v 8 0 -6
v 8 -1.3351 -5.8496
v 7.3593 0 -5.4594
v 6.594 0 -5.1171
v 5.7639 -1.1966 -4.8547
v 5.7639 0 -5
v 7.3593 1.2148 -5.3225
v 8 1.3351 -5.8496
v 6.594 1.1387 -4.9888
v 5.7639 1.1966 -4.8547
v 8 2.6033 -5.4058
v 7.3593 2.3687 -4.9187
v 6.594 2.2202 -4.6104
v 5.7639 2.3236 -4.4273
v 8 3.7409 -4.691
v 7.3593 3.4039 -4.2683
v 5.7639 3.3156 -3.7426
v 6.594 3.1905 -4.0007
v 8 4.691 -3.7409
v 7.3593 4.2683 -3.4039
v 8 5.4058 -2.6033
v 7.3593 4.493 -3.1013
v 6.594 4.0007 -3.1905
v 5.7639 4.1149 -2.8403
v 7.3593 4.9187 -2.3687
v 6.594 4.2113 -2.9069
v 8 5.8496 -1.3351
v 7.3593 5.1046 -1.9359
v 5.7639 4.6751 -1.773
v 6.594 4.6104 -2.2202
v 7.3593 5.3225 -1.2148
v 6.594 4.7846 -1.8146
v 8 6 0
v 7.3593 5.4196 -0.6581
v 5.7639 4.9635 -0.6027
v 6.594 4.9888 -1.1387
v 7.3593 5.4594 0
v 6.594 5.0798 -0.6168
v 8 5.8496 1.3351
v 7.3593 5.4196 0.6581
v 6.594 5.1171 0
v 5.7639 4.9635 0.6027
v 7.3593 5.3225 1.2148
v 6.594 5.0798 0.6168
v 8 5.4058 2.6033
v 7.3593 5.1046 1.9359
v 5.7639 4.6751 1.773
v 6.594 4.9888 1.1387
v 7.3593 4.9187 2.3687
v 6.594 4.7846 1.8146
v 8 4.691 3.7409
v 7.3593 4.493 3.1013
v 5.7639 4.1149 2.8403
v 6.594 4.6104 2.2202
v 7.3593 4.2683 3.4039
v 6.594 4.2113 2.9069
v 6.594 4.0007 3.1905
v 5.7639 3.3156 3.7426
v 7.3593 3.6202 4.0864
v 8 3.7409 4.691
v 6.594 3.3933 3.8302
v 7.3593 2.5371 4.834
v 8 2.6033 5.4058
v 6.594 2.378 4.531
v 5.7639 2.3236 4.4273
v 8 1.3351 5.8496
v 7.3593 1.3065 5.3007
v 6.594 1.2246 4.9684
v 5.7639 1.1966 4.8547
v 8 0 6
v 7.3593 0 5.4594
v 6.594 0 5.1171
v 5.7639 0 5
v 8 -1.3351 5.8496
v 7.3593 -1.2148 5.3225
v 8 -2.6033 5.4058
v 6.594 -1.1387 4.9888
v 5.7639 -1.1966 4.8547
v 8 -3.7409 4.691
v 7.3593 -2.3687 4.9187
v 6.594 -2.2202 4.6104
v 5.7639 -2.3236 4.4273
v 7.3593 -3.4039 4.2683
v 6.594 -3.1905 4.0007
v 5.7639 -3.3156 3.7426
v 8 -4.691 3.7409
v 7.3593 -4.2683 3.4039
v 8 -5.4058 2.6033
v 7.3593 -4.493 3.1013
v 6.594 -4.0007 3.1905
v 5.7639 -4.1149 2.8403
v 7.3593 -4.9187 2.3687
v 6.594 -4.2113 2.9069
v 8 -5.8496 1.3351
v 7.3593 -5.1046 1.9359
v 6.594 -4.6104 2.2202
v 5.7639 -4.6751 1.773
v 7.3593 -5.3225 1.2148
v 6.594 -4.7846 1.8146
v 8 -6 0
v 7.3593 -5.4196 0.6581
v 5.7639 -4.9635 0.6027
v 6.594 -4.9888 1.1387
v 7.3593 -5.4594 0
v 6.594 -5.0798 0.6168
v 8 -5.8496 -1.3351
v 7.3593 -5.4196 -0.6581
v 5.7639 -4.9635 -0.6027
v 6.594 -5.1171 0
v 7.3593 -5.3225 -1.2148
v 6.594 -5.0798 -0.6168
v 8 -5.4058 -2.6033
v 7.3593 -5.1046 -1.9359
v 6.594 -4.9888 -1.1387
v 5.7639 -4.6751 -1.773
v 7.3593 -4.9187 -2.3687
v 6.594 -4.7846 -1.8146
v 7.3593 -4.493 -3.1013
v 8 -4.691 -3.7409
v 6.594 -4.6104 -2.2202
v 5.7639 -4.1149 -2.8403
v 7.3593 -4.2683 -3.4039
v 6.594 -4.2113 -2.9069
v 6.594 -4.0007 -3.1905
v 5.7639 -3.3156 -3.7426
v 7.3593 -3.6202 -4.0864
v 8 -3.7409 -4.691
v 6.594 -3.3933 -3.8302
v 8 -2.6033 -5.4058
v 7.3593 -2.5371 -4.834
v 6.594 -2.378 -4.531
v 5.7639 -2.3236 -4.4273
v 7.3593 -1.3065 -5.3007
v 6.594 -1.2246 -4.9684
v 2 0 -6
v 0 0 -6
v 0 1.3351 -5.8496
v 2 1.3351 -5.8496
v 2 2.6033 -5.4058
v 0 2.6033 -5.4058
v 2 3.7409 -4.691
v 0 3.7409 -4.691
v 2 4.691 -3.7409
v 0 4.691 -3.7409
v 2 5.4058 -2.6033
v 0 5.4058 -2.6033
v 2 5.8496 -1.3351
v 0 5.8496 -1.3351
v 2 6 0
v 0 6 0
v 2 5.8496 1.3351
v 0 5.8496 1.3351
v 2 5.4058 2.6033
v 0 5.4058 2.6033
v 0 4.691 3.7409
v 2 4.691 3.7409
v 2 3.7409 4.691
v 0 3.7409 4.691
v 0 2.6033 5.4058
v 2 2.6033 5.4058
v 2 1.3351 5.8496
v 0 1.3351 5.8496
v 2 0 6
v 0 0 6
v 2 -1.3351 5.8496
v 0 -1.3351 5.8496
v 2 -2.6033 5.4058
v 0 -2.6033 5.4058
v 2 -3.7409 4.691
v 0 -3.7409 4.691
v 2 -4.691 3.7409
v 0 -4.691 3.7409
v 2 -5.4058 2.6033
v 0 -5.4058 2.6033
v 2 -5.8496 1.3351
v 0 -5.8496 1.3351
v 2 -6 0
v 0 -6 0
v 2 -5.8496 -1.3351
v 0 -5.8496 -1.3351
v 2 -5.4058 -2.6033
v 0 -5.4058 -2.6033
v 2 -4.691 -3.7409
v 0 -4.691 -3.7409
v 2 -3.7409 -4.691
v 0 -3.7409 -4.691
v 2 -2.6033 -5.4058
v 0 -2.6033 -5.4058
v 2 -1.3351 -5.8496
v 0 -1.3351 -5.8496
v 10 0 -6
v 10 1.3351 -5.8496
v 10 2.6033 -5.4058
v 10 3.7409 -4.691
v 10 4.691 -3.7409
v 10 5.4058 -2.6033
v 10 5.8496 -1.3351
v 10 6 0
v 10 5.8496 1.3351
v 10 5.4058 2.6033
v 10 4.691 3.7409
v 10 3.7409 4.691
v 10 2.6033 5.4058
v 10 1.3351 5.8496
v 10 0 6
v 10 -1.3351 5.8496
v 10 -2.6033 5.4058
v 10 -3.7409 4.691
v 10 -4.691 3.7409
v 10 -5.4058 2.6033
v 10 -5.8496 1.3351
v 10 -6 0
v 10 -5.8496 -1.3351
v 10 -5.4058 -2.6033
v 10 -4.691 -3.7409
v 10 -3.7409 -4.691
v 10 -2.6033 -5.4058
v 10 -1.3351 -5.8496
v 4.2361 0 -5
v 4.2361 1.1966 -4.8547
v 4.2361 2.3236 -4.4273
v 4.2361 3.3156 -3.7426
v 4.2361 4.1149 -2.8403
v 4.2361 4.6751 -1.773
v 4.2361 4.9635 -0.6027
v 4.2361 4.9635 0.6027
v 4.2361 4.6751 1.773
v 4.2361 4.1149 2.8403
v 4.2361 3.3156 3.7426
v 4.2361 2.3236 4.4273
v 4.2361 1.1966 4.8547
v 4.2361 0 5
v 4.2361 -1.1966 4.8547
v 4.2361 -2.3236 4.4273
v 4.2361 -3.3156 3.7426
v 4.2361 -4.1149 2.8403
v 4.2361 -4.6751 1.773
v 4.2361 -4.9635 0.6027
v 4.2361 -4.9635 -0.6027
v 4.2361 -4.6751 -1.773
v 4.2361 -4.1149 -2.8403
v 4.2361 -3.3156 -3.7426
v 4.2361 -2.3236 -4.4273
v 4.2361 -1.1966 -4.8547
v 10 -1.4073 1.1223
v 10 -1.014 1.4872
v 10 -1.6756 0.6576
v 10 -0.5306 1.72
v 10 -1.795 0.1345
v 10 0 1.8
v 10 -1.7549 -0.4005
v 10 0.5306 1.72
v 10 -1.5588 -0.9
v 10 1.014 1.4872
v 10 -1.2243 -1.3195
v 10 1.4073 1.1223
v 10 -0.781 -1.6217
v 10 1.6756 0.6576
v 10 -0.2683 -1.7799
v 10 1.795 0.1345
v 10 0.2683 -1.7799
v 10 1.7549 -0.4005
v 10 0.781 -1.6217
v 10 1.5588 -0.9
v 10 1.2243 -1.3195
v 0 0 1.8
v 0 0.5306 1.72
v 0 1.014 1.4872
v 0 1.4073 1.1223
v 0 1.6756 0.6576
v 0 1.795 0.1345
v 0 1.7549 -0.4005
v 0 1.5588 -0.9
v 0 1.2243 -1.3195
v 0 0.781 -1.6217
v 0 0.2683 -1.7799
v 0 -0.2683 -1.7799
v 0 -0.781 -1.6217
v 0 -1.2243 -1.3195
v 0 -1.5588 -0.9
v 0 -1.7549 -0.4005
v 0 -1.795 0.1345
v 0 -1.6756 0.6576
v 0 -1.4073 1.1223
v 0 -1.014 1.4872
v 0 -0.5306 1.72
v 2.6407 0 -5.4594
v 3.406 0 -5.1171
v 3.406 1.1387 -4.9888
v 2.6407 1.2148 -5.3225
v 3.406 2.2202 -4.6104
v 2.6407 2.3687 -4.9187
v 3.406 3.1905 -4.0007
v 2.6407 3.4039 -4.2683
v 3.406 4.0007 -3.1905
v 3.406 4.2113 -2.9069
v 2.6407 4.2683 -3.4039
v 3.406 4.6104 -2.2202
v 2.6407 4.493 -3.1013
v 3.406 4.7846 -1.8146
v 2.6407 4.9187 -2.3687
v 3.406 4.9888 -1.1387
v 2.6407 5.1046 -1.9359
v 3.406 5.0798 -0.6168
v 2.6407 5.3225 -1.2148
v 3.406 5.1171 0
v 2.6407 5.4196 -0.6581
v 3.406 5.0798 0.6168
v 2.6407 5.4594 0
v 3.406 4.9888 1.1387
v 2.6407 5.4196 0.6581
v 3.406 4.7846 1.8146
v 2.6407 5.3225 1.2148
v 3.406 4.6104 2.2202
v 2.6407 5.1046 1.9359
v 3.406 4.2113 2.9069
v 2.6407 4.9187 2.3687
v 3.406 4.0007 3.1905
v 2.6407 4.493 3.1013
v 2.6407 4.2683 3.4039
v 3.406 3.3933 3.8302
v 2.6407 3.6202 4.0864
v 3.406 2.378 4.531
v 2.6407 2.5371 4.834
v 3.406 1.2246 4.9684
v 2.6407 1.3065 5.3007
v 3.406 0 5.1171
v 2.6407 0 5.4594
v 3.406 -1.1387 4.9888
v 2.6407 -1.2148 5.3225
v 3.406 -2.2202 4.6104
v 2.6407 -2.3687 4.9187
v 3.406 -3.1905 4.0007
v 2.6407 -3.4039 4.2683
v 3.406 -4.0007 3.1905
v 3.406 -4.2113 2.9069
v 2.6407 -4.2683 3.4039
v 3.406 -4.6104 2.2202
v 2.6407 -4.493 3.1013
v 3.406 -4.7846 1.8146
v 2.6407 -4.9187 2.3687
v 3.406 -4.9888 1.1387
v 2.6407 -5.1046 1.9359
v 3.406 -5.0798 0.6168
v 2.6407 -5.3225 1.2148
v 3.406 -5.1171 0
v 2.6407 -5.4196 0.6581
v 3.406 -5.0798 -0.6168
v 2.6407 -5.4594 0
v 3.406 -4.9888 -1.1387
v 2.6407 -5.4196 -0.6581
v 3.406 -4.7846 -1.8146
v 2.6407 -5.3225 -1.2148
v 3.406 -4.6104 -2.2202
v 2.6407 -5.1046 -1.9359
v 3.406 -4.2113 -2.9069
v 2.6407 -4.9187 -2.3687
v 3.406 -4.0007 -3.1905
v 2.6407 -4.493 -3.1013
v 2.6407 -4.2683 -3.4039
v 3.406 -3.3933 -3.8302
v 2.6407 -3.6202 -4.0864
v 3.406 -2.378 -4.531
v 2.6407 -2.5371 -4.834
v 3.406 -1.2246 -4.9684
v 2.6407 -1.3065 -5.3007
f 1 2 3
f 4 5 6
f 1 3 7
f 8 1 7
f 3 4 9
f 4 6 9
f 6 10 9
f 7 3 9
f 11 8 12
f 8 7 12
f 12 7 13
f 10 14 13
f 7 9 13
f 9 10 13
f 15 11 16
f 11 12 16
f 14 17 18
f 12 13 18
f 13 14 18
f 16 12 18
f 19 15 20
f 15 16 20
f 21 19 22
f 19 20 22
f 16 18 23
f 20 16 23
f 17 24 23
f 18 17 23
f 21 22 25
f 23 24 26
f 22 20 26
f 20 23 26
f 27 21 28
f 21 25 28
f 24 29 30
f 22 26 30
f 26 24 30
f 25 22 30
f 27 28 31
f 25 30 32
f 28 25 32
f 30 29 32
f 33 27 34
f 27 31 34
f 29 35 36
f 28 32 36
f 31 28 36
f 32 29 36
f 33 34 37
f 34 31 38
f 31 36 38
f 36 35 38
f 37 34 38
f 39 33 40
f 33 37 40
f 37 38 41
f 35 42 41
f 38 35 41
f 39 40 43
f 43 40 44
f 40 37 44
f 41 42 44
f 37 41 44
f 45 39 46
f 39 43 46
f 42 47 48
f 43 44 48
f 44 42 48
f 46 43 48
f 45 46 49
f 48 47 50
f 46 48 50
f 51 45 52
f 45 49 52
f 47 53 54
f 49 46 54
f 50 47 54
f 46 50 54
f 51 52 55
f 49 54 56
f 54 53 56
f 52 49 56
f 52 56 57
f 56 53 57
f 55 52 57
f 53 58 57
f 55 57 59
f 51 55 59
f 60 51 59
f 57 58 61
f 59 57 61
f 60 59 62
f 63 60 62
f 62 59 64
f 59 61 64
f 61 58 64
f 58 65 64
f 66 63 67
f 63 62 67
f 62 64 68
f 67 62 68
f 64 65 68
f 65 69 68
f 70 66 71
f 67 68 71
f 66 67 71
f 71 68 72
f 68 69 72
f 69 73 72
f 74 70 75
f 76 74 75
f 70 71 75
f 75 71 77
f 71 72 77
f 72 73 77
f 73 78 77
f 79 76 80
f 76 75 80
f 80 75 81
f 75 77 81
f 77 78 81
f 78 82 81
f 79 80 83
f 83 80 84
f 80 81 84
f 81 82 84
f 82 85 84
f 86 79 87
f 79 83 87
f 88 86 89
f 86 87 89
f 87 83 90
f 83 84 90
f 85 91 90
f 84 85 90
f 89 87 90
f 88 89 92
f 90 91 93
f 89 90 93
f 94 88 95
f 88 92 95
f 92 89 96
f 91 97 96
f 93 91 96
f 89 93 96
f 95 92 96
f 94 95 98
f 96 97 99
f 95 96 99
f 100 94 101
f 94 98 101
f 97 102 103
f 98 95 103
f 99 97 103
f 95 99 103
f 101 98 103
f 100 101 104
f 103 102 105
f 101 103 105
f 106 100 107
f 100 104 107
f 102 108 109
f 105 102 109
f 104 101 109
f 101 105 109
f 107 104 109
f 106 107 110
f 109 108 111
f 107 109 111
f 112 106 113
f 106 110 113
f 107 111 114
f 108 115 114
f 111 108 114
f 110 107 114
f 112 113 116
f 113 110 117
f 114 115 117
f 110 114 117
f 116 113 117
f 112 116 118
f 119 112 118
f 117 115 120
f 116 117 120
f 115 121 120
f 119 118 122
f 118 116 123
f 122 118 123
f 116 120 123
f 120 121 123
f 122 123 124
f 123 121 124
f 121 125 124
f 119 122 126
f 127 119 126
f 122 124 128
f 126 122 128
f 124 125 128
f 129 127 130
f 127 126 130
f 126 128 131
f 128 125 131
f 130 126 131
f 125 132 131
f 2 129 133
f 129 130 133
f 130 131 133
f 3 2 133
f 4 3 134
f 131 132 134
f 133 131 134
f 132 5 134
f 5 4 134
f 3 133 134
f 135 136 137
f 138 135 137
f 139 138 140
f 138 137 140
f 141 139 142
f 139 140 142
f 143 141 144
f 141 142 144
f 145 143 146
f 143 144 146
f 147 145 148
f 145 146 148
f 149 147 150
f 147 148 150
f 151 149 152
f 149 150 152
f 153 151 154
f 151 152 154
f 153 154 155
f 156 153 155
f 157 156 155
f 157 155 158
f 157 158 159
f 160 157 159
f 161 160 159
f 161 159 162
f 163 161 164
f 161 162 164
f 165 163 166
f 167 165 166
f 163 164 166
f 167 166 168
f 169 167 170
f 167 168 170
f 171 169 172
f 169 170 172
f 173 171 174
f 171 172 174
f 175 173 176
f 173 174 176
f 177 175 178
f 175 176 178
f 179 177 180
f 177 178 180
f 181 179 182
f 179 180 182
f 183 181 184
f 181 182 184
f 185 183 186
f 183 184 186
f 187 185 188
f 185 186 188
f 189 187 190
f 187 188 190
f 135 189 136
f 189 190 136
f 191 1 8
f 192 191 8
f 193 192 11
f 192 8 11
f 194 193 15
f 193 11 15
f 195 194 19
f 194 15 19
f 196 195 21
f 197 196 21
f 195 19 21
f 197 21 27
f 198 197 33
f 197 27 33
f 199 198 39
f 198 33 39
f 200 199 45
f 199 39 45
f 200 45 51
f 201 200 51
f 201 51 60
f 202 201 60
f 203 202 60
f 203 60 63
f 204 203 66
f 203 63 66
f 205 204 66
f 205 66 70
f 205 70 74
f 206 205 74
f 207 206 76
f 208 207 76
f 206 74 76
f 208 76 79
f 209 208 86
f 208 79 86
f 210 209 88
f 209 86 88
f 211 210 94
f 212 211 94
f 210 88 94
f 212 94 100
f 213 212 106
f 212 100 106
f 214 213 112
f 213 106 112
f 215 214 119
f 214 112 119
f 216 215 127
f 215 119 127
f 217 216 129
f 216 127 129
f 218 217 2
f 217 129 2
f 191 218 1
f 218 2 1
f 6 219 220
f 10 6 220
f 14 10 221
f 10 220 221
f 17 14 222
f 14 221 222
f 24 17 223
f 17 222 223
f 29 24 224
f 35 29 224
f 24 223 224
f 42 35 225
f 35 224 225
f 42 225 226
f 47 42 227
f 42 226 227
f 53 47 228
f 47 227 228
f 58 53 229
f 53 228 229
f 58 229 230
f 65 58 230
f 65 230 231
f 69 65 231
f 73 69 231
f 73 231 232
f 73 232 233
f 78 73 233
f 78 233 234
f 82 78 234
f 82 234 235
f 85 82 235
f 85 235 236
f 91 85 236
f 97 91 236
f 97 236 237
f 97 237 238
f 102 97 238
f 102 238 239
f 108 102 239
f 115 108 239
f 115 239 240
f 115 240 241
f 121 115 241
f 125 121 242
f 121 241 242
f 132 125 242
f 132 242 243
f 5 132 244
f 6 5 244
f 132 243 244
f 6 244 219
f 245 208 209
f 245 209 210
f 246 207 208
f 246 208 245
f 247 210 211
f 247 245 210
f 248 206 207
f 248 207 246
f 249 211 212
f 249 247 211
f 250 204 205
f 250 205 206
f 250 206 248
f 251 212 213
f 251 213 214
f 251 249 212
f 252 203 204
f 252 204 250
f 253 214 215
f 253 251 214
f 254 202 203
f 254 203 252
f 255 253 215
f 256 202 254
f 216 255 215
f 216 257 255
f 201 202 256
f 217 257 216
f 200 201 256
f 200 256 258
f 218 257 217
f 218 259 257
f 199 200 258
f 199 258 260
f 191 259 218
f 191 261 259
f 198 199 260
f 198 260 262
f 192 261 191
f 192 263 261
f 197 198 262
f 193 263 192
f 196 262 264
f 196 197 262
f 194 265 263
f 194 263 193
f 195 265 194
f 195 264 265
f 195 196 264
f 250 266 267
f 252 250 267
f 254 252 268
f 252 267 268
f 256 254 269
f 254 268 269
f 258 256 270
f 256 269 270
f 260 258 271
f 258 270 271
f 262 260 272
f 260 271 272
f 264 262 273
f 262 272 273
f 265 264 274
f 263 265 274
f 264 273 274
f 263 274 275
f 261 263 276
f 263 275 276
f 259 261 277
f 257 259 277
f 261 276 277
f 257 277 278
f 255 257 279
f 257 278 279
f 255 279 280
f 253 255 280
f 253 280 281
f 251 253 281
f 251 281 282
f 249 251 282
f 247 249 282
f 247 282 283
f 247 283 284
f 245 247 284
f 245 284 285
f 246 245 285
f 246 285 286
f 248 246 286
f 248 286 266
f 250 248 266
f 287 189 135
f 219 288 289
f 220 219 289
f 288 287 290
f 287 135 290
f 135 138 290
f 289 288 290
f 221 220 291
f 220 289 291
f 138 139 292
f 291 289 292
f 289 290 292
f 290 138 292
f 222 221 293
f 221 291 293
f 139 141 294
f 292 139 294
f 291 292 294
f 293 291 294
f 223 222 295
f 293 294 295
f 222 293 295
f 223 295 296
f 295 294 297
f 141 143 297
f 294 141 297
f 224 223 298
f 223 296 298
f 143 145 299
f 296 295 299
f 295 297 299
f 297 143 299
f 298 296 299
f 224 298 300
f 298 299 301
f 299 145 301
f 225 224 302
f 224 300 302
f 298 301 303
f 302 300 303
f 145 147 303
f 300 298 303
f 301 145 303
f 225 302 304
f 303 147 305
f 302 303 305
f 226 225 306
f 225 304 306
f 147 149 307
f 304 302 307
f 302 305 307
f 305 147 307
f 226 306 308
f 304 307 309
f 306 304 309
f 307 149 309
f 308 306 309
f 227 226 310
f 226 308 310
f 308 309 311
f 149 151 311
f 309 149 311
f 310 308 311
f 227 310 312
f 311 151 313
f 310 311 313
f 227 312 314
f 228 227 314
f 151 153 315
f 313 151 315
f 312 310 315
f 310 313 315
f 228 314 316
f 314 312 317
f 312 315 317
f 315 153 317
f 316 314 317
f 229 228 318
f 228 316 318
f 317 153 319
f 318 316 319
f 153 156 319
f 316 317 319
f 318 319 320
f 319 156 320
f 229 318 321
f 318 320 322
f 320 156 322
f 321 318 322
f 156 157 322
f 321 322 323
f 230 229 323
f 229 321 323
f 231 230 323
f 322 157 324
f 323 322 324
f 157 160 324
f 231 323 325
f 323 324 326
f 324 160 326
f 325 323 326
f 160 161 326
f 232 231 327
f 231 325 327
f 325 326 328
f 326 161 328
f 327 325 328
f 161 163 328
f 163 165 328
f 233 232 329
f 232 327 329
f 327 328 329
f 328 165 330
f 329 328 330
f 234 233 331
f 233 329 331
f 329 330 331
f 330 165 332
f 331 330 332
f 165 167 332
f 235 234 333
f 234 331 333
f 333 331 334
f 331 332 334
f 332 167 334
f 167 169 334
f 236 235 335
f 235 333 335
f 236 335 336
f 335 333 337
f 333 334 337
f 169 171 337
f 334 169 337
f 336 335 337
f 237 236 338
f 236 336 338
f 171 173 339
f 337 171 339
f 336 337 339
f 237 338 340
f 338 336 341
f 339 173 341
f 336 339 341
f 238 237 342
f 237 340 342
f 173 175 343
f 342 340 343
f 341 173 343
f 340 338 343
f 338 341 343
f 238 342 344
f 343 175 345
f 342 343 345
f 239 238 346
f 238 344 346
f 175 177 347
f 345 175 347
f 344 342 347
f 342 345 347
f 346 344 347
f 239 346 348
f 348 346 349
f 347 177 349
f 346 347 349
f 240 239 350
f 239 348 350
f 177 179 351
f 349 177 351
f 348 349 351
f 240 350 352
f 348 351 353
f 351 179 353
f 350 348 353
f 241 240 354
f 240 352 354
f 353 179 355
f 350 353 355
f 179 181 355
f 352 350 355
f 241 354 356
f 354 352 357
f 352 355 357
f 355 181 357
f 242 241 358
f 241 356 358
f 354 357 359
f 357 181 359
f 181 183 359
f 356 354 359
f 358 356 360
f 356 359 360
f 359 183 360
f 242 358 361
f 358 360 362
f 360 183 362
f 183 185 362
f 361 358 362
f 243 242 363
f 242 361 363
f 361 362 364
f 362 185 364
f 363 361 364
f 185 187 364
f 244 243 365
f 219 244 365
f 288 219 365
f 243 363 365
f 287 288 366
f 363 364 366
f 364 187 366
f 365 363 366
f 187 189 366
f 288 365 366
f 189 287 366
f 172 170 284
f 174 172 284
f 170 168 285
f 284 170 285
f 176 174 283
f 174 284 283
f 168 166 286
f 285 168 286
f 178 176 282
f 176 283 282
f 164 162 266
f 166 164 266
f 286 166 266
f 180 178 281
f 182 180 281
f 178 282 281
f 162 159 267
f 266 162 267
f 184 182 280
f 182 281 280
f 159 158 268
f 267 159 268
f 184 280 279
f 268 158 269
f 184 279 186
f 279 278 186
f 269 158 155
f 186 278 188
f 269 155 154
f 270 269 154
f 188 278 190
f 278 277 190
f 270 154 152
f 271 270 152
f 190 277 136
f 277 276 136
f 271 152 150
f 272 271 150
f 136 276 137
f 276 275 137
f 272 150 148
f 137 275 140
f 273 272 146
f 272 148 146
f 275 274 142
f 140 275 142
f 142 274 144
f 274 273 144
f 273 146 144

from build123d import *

# Parameters (mm, degrees)
SKETCH1_R           = 6
BOSS_EXTRUDE1_DEPTH = 2
SKETCH2_R           = 5
BOSS_EXTRUDE2_DEPTH = 6
SKETCH3_R           = 6
BOSS_EXTRUDE3_DEPTH = 2
FILLET1_R           = 3
SKETCH4_R           = 1.8
CUT_EXTRUDE1_DEPTH  = 14.114877049


with BuildPart() as part:
    # Sketch1 → Boss-Extrude1 (new body)
    with BuildSketch(Plane(origin=(0, 0, 0), x_dir=(0, 0, -1), z_dir=(1, 0, 0))):
        Circle(SKETCH1_R)
    extrude(amount=BOSS_EXTRUDE1_DEPTH)

    # Sketch2 → Boss-Extrude2 (add)
    with BuildSketch(Plane(origin=(2, 0, 0), x_dir=(0, 0, -1), z_dir=(1, 0, 0))):
        Circle(SKETCH2_R)
    extrude(amount=BOSS_EXTRUDE2_DEPTH)

    # Sketch3 → Boss-Extrude3 (add)
    with BuildSketch(Plane(origin=(8, 0, 0), x_dir=(0, 0, -1), z_dir=(1, 0, 0))):
        Circle(SKETCH3_R)
    extrude(amount=BOSS_EXTRUDE3_DEPTH)

    # Fillet1
    # the kernel refuses this fillet: 3 mm, written as the material it adds along each edge
    with BuildSketch(Plane(origin=(2, 0, 0), x_dir=(0, 0, -1), z_dir=(0, -1, 0))) as fillet1_piece_1:
        with BuildLine():
            CenterArc((8, 2.236067977), FILLET1_R, 180, 48.189685104)
            Line((6, 0), (5.96, -0.04472136))
            ThreePointArc((5.96, -0.04472136), (5.5, -0.06), (5, -0.06))
            Line((5, -0.06), (4.94, 0))
            Line((4.94, 0), (4.94, 2.236067977))
            Line((4.94, 2.236067977), (5, 2.236067977))
        make_face()
    revolve(axis=Axis((2, 0, 0), (1, 0, 0)))
    with BuildSketch(Plane(origin=(8, 0, 0), x_dir=(0, 0, -1), z_dir=(0, -1, 0))) as fillet1_piece_2:
        with BuildLine():
            CenterArc((8, -2.236067977), FILLET1_R, 131.810314896, 48.189685104)
            Line((5, -2.236067977), (4.94, -2.236067977))
            Line((4.94, -2.236067977), (4.94, 0))
            Line((4.94, 0), (5, 0.06))
            ThreePointArc((5, 0.06), (5.5, 0.06), (5.96, 0.04472136))
            Line((5.96, 0.04472136), (6, 0))
        make_face()
    revolve(axis=Axis((8, 0, 0), (1, 0, 0)))

    # Sketch4 → Cut-Extrude1 (cut, through all)
    with BuildSketch(Plane.ZY):
        Circle(SKETCH4_R)
    extrude(amount=-CUT_EXTRUDE1_DEPTH, mode=Mode.SUBTRACT)


solid = part.part
